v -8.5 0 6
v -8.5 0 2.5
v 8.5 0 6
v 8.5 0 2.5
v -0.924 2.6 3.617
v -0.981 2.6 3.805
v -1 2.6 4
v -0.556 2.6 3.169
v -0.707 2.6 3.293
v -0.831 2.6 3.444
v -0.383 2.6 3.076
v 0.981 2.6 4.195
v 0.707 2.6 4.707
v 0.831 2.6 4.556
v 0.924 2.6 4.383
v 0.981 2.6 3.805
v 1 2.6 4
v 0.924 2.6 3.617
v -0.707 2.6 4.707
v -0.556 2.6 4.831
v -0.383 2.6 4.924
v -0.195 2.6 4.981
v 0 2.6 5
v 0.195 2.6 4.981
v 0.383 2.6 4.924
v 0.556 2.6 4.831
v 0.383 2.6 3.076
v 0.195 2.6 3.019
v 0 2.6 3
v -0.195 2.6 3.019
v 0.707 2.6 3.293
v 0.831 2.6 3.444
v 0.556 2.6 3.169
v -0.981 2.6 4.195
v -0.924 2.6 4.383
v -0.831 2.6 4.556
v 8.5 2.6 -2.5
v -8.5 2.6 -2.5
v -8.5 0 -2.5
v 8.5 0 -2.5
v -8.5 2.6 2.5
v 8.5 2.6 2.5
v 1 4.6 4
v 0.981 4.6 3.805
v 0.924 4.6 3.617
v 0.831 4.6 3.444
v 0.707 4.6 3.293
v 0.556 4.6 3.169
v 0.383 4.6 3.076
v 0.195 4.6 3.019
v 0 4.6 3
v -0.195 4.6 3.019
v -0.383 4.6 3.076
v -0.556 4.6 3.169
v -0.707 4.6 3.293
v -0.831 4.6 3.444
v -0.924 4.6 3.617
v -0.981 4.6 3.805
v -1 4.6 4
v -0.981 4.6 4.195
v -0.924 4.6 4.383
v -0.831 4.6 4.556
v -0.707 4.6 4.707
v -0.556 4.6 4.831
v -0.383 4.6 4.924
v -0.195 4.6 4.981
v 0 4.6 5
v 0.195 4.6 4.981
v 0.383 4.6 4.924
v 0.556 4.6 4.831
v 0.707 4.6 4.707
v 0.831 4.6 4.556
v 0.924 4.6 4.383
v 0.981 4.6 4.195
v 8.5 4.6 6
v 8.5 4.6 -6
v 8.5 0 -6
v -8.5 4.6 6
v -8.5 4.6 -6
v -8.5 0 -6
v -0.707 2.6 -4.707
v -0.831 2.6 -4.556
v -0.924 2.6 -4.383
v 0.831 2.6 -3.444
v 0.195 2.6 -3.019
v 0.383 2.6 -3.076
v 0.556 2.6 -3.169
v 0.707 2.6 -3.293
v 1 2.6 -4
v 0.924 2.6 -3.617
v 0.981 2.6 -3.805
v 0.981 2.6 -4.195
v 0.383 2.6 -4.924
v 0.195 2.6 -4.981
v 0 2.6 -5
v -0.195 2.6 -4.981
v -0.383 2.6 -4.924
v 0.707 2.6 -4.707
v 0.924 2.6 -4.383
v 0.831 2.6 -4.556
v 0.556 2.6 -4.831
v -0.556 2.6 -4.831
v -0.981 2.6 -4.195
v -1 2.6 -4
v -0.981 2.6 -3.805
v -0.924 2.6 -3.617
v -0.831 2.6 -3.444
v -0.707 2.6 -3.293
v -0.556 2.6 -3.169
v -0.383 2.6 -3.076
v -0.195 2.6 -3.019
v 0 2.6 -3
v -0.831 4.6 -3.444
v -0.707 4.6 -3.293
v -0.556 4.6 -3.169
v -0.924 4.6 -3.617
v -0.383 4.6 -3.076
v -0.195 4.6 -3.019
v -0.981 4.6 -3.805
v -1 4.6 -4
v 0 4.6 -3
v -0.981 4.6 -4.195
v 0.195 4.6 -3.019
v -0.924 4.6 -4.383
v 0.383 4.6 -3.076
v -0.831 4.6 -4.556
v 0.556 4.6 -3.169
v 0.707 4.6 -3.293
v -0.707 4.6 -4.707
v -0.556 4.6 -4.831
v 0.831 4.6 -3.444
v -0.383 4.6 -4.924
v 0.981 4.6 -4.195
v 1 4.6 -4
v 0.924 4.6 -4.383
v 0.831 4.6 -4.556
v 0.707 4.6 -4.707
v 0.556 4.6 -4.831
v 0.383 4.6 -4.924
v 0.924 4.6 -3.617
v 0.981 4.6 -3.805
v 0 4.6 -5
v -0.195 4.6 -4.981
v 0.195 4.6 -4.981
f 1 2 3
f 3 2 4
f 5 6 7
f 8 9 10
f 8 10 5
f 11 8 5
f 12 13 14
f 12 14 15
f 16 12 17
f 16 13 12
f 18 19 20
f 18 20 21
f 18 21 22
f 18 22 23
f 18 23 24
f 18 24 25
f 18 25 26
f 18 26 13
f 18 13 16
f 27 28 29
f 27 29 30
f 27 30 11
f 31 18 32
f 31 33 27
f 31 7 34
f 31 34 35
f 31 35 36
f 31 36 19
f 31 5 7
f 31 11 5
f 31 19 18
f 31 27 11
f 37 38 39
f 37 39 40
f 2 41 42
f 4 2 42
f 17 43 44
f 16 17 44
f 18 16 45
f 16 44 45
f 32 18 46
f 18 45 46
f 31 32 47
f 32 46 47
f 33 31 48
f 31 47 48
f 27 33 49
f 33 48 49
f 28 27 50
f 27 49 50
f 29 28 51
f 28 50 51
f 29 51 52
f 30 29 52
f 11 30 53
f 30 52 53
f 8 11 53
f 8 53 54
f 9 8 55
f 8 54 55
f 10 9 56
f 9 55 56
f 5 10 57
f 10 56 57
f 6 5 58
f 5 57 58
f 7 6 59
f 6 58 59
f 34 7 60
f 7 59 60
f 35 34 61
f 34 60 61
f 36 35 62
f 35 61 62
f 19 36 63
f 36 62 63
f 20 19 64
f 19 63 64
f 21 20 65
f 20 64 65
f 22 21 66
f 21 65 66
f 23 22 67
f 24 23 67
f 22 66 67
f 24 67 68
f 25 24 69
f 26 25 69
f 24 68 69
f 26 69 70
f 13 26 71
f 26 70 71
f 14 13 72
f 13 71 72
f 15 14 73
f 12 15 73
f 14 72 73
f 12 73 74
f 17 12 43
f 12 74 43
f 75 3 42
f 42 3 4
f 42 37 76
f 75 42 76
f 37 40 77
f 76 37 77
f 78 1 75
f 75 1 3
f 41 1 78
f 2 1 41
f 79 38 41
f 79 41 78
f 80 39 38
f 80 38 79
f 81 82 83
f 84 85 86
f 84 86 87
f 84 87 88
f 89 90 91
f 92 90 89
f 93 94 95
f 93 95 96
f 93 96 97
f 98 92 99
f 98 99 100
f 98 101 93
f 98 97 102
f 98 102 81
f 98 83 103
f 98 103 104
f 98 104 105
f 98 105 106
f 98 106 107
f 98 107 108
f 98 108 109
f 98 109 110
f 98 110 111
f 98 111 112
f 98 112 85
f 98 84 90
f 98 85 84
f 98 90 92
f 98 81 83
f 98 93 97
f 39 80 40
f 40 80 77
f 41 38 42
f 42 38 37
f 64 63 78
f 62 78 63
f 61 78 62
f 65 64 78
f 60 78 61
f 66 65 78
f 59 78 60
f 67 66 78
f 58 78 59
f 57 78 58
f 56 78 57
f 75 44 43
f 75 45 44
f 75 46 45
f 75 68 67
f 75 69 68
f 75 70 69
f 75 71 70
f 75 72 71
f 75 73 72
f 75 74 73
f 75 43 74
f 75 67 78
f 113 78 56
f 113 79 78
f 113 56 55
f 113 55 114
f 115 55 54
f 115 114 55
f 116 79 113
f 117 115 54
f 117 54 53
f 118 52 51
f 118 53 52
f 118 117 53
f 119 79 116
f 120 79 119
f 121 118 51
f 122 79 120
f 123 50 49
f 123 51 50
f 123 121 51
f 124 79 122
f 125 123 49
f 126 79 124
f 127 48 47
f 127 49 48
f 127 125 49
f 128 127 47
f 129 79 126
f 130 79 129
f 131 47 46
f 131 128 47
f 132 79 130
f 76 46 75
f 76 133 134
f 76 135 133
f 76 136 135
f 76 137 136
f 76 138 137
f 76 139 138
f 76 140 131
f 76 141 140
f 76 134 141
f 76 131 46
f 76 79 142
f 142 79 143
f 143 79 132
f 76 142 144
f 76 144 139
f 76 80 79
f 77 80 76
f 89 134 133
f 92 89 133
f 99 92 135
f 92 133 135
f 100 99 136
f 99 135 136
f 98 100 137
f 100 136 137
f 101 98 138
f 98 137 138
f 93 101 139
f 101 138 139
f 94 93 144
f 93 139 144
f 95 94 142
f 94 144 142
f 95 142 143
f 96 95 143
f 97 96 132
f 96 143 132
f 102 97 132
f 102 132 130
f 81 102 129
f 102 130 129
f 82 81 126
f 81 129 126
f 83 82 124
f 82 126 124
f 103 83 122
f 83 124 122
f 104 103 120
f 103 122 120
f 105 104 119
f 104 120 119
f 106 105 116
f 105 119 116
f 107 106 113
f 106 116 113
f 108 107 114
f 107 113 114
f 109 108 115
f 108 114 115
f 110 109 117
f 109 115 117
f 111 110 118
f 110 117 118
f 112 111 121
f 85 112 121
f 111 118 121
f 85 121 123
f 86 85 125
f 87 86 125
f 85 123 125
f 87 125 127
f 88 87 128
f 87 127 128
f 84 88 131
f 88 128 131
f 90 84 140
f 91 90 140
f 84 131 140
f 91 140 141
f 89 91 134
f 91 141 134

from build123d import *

# Parameters (mm, degrees)
SKETCH_1_W          = 17
SKETCH_1_H          = 12
EXTRUDE_1_DEPTH     = 4.6
SKETCH_3_W          = 17
SKETCH_3_H          = 5
CUT_EXTRUDE_1_DEPTH = 2.6
SKETCH_4_R          = 1
CUT_EXTRUDE_2_DEPTH = 2


with BuildPart() as part:
    # 스케치1 → 보스-돌출1 (new body)
    with BuildSketch(Plane(origin=(0, 0, 0), x_dir=(1, 0, 0), z_dir=(0, 1, 0))):
        Rectangle(SKETCH_1_W, SKETCH_1_H)
    extrude(amount=EXTRUDE_1_DEPTH)

    # 스케치3 → 컷-돌출1 (cut)
    with BuildSketch(Plane(origin=(0, 2.6, 0), x_dir=(1, 0, 0), z_dir=(0, 1, 0))):
        Rectangle(SKETCH_3_W, SKETCH_3_H)
    extrude(amount=-CUT_EXTRUDE_1_DEPTH, mode=Mode.SUBTRACT)

    # 스케치4 → 컷-돌출2 (cut)
    with BuildSketch(Plane(origin=(0, 4.6, 0), x_dir=(1, 0, 0), z_dir=(0, 1, 0))):
        with Locations((0, 4)):
            Circle(SKETCH_4_R)
        with Locations((0, -4)):
            Circle(SKETCH_4_R)
    extrude(amount=-CUT_EXTRUDE_2_DEPTH, mode=Mode.SUBTRACT)


solid = part.part
